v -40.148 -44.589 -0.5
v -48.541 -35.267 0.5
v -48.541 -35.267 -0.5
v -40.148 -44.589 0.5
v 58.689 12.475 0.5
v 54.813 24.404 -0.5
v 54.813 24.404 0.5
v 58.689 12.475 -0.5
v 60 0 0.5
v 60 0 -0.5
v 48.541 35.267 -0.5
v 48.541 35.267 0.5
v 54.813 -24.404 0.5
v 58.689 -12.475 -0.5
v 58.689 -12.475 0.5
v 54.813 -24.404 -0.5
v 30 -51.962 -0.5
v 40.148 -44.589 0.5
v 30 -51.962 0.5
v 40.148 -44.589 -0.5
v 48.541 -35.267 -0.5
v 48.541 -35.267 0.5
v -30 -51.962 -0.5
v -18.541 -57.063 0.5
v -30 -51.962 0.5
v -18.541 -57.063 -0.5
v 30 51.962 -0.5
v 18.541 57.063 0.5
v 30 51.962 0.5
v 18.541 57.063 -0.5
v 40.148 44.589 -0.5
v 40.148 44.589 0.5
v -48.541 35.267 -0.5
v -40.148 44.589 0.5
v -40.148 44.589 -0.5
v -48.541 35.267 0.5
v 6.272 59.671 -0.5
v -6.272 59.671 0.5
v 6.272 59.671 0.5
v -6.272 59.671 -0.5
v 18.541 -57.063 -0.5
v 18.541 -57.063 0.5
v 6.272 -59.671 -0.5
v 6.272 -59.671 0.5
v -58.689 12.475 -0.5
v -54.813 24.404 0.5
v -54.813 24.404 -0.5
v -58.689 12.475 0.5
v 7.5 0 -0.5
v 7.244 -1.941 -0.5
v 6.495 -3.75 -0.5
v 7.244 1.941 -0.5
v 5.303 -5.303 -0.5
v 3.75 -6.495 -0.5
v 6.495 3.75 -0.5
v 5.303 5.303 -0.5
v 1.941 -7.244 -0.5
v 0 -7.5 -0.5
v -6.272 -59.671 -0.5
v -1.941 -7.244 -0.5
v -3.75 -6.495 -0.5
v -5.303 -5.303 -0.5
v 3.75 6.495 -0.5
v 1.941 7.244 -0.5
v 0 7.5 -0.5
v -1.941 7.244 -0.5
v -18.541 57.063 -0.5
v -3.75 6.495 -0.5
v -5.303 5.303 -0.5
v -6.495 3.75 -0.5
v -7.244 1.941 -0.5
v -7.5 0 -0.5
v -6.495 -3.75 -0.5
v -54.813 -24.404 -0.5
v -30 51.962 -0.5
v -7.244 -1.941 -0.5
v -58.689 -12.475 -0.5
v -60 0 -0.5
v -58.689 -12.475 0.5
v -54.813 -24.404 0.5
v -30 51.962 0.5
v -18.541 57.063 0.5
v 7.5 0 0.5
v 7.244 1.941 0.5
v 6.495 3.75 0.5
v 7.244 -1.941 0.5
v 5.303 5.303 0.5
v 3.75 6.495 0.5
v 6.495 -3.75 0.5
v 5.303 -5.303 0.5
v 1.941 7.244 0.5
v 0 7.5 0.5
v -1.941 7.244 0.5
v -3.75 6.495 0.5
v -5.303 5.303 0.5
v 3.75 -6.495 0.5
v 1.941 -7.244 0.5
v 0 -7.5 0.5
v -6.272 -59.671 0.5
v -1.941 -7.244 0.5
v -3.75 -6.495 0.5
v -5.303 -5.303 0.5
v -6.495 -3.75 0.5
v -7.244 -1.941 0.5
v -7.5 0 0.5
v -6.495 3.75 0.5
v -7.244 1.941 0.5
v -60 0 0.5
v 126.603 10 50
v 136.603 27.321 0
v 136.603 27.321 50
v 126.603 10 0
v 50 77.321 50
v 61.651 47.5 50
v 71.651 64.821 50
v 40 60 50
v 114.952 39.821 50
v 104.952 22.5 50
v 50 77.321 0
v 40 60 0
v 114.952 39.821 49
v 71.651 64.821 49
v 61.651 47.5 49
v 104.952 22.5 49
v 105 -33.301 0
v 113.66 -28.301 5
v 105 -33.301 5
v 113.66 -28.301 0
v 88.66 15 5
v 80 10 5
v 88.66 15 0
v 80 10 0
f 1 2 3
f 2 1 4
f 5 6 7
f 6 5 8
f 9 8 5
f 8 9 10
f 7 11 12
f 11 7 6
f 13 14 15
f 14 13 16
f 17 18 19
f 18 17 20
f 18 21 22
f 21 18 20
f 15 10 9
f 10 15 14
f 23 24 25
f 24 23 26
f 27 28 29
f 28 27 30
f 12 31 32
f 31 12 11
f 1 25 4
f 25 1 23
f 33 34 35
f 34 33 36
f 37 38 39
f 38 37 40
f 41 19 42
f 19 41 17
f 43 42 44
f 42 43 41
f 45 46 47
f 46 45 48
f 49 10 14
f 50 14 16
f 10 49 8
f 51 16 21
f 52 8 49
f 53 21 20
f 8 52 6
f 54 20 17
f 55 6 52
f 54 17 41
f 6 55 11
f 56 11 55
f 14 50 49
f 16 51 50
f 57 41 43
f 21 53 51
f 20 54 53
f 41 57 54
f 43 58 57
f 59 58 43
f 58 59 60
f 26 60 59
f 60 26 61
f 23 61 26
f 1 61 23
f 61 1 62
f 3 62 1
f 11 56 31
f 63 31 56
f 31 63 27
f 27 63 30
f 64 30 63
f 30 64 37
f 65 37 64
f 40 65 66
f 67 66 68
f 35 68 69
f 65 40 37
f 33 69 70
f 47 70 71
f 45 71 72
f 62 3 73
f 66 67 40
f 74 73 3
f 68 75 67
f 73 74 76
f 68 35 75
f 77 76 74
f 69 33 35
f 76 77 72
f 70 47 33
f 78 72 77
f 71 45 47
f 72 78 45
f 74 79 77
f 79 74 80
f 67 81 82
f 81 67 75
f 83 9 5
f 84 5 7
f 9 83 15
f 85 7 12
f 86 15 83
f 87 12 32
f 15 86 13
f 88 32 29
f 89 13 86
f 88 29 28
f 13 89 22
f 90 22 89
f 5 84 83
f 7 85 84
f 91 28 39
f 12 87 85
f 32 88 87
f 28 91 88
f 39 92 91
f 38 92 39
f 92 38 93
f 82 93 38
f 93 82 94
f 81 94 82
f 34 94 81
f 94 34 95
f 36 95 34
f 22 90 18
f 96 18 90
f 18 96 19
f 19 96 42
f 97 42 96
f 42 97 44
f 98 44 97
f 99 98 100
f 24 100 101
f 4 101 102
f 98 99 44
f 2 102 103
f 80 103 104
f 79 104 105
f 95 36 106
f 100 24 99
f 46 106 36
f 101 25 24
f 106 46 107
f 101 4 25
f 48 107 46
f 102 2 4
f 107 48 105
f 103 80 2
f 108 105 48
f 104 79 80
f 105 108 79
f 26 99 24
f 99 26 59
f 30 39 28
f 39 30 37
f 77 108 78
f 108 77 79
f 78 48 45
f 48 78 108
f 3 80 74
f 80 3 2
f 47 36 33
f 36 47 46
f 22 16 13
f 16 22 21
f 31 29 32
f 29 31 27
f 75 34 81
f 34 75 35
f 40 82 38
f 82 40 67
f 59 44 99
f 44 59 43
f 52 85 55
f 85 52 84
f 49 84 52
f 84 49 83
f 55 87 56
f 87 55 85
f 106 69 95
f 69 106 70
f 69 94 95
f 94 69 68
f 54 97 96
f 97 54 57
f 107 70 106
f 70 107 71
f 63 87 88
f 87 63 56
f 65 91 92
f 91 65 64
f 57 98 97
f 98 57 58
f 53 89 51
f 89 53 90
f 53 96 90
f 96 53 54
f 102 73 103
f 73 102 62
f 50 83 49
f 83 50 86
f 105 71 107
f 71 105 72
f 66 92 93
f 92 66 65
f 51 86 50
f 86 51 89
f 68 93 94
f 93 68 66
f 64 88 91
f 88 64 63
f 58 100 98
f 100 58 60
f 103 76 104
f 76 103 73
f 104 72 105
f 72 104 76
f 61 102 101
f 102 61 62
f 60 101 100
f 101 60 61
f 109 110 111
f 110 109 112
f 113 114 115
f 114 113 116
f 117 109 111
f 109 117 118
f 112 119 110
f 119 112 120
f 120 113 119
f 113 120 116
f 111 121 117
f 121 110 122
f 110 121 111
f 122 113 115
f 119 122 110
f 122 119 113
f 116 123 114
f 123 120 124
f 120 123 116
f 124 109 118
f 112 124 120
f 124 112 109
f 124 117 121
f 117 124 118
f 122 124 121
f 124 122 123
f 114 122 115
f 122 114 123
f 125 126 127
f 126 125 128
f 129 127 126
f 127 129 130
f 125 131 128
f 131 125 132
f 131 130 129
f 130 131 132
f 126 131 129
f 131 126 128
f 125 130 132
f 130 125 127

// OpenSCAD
module disc(){
    color([0.9,0.9,0.9]){
        difference(){
            cylinder(h=1,d=120,center=true);
            cylinder(h=2,d=15,center=true);
        }
    }
}

module tape(){
    difference(){
    color([0.5,0.5,0.5]){
        cube([100,20,50]);
    }
    color([0.9,0.9,0.9]){
        translate([25,-1,49]){
        cube([50,22,2]);
    }}
    }
}

disc();
translate([40,60,0]){rotate([0,0,-30]){
    tape();
}}

translate([80,10,0]){rotate([0,0,-60]){
    color([0.9,0.9,0.9]){
        cube([50,10,5]);
    }
}}
